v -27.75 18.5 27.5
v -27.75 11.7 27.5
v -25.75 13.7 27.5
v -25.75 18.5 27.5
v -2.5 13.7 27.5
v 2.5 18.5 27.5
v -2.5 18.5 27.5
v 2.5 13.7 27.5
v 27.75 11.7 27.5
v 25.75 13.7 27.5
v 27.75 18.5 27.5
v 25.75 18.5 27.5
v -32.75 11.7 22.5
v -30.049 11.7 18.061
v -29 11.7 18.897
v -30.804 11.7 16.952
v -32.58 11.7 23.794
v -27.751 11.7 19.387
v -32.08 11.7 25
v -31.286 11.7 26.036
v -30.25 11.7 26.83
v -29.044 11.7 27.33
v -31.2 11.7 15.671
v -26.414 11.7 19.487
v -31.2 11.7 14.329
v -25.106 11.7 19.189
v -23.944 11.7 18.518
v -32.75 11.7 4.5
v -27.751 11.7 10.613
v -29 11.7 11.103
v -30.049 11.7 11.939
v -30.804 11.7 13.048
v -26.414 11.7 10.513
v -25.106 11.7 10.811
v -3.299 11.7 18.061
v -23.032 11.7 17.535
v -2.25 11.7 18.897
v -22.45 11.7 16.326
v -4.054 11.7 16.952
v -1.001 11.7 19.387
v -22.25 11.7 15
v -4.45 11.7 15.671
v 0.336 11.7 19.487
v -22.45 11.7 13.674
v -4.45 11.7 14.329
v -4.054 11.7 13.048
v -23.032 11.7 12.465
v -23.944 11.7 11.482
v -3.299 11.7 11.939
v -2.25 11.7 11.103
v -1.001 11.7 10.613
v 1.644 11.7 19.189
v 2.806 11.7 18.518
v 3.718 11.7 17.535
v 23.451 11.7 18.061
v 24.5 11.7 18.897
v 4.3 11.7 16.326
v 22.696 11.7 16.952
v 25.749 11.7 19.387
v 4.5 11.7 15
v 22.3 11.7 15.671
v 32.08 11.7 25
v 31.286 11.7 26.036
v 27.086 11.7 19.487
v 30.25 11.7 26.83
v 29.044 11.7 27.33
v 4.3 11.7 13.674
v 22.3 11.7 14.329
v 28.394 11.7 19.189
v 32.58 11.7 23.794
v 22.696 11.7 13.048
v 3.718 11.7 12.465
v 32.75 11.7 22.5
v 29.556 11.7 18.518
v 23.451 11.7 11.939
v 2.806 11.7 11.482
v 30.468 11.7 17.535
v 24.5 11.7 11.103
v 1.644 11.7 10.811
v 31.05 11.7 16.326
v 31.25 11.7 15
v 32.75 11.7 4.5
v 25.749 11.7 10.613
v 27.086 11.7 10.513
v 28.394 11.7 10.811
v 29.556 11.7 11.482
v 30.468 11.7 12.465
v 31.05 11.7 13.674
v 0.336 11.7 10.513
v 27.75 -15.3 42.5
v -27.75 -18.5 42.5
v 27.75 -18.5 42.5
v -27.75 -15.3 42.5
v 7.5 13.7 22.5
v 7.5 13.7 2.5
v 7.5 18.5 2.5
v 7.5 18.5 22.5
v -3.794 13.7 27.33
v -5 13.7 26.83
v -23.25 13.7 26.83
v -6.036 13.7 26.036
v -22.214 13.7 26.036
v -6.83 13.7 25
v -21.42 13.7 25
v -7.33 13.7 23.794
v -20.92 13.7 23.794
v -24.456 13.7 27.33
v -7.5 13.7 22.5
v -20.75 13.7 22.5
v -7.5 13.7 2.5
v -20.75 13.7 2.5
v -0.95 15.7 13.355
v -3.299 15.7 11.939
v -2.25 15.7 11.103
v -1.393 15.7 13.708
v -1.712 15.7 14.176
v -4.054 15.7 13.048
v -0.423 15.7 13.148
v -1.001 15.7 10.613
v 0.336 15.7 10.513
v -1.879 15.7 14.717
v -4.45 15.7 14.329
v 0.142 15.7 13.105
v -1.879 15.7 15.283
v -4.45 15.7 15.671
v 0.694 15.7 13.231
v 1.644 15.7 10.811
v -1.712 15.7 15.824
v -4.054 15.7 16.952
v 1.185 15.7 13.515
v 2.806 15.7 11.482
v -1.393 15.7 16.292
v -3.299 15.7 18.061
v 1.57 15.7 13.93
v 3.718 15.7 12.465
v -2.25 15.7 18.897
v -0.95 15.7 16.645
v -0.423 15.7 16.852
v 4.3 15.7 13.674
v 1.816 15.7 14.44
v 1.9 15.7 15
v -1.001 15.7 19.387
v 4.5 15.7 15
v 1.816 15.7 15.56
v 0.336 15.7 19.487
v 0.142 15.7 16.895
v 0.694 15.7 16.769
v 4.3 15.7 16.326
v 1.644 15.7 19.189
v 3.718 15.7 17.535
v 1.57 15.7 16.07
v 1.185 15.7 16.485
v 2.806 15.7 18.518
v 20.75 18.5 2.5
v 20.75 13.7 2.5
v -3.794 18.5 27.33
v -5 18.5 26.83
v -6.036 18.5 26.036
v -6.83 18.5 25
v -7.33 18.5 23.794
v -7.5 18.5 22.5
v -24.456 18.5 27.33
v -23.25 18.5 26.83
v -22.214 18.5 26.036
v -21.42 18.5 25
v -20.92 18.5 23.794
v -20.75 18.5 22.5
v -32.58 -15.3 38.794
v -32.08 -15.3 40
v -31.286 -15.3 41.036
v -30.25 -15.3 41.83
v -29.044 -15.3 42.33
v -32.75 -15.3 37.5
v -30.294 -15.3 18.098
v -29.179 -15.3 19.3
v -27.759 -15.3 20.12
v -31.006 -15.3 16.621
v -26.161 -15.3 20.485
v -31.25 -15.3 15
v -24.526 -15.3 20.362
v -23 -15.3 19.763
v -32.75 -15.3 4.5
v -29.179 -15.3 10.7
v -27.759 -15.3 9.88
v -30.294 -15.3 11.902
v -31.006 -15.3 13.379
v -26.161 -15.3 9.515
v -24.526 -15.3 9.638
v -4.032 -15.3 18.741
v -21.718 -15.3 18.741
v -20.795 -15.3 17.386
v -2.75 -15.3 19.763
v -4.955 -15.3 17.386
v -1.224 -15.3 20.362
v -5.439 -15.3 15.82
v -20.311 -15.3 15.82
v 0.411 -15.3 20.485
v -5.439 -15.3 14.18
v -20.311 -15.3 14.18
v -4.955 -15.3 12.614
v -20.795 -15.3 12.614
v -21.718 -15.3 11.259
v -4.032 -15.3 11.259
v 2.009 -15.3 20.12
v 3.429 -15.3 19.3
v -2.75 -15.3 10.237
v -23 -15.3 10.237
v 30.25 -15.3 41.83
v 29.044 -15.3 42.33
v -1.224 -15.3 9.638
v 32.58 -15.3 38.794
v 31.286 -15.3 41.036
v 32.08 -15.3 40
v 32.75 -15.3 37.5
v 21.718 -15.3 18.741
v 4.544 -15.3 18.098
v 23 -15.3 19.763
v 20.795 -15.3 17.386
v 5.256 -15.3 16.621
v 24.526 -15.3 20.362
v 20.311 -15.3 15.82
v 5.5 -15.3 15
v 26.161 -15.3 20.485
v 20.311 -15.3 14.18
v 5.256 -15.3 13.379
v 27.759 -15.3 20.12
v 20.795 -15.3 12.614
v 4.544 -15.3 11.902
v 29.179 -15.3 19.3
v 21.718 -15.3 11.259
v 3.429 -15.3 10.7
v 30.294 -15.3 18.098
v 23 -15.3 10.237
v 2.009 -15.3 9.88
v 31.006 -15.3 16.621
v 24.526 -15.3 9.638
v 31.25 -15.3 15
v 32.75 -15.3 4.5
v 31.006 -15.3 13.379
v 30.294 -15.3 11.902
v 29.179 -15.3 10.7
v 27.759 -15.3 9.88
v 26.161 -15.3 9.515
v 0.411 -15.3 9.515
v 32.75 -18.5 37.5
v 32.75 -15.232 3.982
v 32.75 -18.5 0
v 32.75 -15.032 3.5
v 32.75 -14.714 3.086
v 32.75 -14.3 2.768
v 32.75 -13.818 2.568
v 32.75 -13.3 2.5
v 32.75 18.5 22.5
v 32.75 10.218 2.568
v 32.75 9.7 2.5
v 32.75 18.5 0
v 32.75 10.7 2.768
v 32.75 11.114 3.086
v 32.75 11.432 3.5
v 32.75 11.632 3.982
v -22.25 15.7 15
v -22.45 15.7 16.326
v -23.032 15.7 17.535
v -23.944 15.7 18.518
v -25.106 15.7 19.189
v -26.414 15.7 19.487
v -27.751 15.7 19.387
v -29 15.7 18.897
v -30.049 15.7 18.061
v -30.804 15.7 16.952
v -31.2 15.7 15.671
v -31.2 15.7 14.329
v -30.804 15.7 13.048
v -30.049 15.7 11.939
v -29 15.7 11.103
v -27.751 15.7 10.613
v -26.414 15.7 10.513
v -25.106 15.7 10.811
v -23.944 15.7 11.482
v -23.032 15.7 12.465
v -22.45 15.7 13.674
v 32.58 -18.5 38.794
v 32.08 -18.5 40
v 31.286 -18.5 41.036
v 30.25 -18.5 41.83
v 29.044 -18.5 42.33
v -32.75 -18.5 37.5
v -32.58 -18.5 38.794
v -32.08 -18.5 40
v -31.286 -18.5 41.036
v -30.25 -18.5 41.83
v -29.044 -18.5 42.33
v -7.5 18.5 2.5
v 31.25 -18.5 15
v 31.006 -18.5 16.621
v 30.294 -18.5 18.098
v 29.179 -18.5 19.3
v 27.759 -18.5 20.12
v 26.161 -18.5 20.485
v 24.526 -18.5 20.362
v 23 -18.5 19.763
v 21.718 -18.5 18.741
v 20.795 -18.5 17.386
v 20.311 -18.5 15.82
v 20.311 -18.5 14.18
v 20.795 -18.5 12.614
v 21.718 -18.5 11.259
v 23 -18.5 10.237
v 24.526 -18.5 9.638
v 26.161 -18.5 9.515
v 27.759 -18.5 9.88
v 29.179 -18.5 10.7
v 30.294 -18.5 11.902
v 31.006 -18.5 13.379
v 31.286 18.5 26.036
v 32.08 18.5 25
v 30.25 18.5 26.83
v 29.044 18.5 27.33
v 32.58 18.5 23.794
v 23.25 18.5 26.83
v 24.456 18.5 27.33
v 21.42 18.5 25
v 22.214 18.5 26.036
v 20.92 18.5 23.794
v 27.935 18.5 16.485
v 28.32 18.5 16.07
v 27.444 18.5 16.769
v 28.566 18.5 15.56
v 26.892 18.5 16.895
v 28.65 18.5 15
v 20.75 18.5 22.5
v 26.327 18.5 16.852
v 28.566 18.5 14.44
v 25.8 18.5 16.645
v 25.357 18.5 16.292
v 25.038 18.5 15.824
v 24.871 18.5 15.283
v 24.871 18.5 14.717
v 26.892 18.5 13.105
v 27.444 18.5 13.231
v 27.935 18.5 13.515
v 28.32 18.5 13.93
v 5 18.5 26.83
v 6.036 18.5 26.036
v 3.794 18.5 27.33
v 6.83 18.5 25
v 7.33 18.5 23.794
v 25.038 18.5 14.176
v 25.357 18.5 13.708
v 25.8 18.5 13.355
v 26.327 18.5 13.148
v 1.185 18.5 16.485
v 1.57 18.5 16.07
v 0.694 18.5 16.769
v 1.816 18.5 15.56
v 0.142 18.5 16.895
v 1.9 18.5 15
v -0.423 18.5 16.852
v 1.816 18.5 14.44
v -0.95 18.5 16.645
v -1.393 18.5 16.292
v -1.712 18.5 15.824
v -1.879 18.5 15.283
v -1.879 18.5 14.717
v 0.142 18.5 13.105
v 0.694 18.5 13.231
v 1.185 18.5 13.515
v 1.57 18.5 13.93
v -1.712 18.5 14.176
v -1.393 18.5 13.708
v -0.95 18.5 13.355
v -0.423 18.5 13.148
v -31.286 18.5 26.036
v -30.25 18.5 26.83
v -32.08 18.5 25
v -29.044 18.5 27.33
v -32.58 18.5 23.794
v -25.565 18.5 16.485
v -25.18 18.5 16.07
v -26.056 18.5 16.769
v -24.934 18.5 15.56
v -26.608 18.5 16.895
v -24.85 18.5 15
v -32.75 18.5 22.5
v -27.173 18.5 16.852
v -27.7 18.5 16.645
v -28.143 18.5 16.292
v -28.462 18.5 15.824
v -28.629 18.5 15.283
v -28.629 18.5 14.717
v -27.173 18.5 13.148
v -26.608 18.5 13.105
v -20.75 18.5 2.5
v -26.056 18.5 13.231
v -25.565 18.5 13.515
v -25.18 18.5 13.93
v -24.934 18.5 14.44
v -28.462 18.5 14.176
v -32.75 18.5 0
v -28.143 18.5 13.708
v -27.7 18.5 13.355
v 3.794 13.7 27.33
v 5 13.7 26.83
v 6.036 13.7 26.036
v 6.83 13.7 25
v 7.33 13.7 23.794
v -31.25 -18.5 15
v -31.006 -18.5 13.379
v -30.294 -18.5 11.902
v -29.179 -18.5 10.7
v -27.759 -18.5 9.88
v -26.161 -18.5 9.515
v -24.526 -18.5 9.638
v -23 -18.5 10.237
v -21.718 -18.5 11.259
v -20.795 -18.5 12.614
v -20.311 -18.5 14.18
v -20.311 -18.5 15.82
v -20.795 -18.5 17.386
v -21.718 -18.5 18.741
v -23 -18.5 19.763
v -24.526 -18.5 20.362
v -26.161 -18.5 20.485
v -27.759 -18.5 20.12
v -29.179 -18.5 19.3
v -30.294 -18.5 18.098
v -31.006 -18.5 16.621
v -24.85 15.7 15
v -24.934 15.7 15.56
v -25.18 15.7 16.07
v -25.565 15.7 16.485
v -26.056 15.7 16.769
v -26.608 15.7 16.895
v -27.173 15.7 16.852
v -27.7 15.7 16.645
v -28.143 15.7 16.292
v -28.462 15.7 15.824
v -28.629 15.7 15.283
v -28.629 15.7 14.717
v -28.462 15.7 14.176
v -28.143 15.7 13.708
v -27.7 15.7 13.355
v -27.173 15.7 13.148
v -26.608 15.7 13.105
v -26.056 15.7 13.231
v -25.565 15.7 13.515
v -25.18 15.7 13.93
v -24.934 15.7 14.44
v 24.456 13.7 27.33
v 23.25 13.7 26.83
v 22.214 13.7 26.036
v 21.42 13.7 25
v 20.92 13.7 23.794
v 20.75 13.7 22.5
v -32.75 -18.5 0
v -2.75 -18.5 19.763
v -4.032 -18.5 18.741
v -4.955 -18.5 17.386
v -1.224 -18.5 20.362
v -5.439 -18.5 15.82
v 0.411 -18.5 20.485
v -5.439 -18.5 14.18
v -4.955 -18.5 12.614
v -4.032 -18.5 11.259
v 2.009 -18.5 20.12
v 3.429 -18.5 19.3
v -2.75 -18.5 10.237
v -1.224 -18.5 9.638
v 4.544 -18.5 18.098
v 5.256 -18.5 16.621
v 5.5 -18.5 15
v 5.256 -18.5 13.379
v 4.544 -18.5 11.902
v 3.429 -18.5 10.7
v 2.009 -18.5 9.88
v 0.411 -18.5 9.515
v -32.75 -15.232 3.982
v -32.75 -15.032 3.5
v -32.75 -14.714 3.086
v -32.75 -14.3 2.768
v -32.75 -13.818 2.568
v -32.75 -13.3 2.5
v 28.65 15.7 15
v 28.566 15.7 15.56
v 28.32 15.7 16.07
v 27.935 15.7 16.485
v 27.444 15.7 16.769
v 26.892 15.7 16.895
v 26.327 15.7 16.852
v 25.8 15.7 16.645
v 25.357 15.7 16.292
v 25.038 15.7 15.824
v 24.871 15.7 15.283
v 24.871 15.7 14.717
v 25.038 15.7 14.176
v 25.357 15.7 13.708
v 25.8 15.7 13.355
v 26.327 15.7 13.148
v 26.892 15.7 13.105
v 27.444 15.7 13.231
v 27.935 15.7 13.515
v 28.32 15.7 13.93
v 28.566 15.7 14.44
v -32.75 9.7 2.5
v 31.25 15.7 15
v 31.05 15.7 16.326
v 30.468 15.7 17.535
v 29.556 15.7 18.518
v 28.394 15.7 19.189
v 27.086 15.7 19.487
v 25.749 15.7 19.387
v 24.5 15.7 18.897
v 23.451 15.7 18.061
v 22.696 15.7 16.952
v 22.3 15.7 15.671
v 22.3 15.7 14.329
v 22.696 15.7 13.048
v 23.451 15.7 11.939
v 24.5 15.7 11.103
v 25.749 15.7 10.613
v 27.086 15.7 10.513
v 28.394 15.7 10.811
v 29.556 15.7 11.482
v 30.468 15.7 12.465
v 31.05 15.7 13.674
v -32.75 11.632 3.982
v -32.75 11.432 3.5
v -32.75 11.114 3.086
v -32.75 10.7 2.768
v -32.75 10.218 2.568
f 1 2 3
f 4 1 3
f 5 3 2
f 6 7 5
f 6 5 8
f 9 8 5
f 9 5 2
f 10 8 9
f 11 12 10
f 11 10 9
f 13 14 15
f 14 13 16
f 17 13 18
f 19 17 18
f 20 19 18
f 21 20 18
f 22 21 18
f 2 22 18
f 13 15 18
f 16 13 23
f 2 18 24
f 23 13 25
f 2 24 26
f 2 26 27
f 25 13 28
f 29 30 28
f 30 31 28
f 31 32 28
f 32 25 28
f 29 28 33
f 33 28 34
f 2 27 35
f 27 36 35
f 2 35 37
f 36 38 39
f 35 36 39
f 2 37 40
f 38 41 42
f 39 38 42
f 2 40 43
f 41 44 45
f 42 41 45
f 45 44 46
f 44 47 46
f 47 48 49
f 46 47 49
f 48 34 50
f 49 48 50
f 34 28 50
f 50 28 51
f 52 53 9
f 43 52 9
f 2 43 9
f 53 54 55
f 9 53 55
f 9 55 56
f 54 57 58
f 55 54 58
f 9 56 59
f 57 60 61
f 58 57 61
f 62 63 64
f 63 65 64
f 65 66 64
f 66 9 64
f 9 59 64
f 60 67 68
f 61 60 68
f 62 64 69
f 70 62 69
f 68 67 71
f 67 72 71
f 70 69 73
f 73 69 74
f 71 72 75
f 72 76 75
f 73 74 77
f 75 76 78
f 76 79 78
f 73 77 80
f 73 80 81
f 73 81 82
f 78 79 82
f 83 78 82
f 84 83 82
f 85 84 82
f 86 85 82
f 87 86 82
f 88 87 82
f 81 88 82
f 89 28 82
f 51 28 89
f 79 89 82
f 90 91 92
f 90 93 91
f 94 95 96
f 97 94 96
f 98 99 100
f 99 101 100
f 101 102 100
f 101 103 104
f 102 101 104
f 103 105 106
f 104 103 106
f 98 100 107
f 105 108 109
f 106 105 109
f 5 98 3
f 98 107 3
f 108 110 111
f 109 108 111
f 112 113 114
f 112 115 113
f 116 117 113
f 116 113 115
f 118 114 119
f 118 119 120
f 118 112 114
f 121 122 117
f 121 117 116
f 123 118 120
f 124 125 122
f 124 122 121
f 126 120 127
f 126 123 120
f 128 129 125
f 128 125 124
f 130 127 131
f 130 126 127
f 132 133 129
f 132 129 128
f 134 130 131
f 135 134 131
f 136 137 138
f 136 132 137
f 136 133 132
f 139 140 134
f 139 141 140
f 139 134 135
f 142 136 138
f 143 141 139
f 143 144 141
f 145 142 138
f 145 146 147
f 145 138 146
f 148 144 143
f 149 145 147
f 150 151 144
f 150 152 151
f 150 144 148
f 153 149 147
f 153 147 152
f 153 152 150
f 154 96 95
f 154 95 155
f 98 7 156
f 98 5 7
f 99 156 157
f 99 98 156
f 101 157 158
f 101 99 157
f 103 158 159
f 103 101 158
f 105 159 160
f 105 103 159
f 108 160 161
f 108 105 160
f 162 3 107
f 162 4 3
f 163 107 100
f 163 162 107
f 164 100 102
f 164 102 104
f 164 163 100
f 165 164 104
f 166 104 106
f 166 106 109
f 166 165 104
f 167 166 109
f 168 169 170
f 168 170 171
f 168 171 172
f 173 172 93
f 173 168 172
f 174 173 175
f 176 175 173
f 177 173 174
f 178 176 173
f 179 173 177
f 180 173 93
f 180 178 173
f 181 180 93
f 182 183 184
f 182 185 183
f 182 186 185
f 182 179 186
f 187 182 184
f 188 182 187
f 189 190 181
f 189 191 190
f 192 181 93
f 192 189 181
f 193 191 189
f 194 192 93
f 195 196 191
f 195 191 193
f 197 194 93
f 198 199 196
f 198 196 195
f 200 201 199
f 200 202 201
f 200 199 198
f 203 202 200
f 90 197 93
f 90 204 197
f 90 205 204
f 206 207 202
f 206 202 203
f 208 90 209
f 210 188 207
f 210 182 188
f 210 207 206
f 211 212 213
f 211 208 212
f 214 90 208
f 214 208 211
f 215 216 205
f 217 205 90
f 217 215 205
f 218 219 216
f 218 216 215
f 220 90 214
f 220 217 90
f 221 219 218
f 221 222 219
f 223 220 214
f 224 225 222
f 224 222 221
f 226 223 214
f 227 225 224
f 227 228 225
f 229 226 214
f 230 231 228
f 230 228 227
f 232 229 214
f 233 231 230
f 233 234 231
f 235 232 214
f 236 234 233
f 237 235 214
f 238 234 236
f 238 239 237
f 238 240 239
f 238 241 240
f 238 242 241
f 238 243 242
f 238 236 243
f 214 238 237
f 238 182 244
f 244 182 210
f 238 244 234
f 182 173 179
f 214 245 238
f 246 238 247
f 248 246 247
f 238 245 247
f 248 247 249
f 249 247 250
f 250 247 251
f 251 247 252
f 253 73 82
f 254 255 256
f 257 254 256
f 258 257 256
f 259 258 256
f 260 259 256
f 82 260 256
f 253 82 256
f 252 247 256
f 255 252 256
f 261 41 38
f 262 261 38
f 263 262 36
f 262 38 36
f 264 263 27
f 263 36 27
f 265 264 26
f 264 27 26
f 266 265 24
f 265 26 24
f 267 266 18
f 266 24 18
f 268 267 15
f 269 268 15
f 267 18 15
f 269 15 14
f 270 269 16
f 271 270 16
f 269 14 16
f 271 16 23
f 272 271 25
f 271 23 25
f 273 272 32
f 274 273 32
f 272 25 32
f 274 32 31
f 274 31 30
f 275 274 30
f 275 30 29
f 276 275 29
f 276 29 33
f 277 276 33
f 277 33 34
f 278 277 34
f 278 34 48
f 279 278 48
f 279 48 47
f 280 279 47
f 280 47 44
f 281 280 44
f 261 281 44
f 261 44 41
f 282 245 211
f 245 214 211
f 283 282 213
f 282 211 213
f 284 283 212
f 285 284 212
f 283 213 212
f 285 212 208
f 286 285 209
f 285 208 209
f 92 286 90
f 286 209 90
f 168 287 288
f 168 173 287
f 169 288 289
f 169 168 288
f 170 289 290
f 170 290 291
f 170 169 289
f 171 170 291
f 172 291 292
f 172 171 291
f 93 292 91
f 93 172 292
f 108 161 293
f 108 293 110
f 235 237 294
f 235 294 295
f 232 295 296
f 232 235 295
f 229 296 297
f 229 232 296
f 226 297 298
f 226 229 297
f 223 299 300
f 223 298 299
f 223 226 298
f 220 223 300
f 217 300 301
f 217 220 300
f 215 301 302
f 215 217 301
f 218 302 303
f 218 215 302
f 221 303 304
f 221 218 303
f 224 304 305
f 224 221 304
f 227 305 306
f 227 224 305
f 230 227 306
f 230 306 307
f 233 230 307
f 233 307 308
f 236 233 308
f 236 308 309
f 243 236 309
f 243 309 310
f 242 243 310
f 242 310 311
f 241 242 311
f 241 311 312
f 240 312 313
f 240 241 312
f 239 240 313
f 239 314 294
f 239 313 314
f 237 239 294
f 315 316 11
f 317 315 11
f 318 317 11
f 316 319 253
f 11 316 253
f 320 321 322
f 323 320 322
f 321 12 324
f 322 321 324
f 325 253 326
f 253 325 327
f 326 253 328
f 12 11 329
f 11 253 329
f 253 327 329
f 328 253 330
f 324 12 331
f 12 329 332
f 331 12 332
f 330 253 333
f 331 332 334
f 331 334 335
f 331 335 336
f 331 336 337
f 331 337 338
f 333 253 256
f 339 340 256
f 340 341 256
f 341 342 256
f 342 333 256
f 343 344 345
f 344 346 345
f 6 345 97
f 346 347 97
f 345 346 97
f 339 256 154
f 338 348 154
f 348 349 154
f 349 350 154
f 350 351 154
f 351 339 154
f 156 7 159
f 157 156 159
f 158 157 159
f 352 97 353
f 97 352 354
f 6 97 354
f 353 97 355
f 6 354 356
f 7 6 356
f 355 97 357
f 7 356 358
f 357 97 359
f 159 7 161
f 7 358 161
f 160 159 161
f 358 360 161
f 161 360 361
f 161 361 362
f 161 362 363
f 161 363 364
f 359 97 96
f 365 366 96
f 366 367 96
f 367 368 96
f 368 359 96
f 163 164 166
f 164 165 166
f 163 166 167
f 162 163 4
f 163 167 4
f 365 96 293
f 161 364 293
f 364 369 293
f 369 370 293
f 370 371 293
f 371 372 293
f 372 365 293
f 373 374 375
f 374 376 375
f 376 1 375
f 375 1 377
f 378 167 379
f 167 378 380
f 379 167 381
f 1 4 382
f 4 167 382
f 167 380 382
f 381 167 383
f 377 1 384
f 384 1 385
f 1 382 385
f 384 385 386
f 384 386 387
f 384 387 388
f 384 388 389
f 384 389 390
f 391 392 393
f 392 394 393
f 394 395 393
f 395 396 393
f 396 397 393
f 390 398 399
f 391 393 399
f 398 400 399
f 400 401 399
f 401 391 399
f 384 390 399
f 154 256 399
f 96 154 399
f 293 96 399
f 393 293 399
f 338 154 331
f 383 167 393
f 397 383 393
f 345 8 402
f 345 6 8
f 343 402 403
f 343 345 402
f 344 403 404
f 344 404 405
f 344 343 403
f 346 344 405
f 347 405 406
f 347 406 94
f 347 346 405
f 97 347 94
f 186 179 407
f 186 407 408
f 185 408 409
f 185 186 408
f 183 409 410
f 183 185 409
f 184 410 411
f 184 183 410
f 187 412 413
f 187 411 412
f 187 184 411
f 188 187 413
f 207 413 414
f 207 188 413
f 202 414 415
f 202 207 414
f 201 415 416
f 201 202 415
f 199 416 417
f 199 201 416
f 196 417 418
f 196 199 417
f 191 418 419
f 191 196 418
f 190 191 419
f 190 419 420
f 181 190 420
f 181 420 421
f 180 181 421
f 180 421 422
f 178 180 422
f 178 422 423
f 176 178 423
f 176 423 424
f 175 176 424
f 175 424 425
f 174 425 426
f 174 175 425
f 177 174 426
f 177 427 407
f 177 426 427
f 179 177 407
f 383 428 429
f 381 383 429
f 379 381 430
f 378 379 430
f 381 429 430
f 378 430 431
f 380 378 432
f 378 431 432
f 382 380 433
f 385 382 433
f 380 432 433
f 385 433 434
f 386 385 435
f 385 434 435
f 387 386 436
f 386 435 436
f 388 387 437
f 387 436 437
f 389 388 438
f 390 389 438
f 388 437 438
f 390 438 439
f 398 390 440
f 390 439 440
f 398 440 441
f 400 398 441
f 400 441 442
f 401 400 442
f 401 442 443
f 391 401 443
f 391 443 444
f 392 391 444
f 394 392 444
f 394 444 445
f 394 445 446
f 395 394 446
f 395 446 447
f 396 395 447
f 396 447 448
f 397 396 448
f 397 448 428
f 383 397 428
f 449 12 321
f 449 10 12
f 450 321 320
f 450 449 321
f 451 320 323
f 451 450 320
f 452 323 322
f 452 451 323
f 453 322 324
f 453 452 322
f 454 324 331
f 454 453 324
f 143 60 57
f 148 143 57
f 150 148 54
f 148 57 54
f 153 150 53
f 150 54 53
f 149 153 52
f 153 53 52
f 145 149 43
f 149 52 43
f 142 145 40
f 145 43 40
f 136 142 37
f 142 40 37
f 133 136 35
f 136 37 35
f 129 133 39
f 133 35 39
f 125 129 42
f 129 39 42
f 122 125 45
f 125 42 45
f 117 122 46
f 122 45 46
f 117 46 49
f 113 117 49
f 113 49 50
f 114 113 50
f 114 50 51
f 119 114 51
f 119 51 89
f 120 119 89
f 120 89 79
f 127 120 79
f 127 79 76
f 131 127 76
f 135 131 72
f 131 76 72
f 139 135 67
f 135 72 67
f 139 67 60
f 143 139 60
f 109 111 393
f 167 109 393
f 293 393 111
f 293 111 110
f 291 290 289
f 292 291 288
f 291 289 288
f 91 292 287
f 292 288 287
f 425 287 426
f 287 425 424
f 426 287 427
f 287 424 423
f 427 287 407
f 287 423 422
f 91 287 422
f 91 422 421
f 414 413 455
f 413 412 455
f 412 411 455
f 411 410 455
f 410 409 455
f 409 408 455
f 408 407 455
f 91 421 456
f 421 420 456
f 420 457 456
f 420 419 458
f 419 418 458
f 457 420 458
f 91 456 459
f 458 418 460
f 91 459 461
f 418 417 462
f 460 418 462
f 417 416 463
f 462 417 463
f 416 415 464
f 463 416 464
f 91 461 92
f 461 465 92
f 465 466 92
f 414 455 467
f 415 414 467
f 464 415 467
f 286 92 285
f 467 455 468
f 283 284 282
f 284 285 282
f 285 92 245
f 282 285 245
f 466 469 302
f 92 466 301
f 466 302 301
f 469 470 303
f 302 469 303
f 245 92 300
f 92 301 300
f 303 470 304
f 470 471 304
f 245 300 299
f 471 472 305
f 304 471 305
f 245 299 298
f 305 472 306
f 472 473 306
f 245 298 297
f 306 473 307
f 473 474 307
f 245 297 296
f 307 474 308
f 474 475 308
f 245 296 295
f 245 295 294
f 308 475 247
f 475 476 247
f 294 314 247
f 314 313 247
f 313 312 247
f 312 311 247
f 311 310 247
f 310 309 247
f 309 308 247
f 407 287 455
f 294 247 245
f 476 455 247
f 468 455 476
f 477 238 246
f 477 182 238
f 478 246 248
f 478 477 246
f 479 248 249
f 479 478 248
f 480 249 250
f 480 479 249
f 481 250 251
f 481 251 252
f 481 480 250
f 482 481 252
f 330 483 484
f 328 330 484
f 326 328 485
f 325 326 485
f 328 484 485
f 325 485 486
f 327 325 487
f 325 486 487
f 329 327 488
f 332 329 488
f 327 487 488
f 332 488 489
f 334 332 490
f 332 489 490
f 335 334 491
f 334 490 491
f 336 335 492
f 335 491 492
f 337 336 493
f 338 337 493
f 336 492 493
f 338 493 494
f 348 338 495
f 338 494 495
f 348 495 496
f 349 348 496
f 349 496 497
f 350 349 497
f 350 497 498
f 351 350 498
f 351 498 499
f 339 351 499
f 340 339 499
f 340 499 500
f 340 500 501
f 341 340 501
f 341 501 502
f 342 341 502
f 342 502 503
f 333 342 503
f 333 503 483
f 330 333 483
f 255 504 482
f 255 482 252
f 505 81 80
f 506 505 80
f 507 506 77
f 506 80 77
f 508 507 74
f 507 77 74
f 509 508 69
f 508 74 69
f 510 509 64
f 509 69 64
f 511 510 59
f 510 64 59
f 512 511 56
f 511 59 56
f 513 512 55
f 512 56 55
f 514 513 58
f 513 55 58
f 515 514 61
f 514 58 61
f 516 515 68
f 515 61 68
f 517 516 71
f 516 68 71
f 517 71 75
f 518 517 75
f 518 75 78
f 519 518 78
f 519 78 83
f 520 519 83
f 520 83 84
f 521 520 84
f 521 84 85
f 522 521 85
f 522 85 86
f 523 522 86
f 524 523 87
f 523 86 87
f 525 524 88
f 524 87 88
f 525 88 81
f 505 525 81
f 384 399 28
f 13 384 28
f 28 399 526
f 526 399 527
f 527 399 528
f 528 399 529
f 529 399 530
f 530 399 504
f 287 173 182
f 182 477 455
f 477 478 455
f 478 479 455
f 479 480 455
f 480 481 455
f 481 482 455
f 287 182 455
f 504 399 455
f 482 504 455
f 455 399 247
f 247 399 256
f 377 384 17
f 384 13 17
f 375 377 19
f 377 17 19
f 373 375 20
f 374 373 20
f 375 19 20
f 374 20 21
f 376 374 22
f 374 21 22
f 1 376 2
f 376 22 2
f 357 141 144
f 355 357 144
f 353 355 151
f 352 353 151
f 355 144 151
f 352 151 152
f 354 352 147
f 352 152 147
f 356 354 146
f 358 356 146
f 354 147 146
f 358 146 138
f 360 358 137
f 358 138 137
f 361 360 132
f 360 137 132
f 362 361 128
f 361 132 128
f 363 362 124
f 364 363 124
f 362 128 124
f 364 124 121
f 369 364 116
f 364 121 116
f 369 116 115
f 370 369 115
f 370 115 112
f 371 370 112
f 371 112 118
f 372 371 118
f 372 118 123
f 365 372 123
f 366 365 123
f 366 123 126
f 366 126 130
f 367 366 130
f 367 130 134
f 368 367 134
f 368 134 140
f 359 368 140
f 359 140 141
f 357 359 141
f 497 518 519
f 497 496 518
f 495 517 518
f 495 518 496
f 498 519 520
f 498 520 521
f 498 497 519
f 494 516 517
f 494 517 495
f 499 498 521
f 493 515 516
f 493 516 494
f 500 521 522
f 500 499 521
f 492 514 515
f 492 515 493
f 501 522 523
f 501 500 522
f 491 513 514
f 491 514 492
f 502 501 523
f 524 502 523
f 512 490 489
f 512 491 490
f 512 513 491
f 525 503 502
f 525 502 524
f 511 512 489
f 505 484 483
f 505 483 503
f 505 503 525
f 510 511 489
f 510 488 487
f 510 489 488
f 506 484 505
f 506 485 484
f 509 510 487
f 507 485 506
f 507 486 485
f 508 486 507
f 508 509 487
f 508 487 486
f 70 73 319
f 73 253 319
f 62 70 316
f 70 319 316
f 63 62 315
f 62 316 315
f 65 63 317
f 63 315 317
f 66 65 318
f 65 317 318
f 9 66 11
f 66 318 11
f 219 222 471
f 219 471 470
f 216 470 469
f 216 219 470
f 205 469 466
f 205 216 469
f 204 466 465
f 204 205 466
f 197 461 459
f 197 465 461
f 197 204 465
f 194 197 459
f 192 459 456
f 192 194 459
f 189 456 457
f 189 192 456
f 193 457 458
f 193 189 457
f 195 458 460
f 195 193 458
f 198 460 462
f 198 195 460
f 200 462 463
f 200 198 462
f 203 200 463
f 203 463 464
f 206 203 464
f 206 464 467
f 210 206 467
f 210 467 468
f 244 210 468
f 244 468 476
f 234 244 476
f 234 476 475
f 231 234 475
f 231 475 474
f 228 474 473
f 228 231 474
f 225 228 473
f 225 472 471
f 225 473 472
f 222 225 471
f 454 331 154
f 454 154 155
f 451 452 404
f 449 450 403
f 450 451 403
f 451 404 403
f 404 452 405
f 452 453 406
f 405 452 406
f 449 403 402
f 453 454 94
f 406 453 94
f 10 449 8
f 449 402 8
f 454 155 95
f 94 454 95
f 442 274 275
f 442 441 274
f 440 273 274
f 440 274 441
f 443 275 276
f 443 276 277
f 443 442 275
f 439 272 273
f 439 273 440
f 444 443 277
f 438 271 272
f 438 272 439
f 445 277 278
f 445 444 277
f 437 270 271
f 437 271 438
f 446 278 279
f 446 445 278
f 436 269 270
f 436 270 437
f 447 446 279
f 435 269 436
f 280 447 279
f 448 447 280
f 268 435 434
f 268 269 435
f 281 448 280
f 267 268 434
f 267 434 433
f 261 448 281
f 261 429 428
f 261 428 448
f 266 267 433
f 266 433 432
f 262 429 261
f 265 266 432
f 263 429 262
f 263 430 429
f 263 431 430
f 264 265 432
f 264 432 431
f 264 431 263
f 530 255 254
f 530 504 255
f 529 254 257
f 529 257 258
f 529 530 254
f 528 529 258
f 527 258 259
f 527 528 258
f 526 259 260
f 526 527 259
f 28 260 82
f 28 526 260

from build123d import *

# Parameters (mm, degrees)
F0_W     = 13.25
F0_H     = 4.8
F0_W_2   = 65.5
F0_H_2   = 27
F0_H_3   = 3.2
F1_DEPTH = 2.5
F2_DEPTH = 27.5
F3_DEPTH = 42.5
F4_R     = 1.9
F5_DEPTH = 6.801
F4_R_2   = 4.5
F6_DEPTH = 4
F4_R_3   = 5.5
F7_DEPTH = 30.201
F8_R     = 5
F9_R     = 2


with BuildPart() as f1:
    # F0 (on Top) → F1 (new body)
    with BuildSketch(Plane.XY):
        Polygon((-20.75, 18.5), (-32.75, 18.5), (-32.75, 11.7), (32.75, 11.7), (32.75, 18.5), (20.75, 18.5), (20.75, 13.7), (7.5, 13.7), (7.5, 18.5), (-7.5, 18.5), (-7.5, 13.7), (-20.75, 13.7), align=None)
        with Locations((-14.125, 16.1)):
            Rectangle(F0_W, F0_H)
        with Locations((0, -1.8)):
            Rectangle(F0_W_2, F0_H_2)
        with Locations((0, -16.9)):
            Rectangle(F0_W_2, F0_H_3)
        with Locations((14.125, 16.1)):
            Rectangle(F0_W, F0_H)
    extrude(amount=F1_DEPTH)

    # F0 (on Top) → F2 (join)
    with BuildSketch(Plane.XY):
        Polygon((-20.75, 18.5), (-32.75, 18.5), (-32.75, 11.7), (32.75, 11.7), (32.75, 18.5), (20.75, 18.5), (20.75, 13.7), (7.5, 13.7), (7.5, 18.5), (-7.5, 18.5), (-7.5, 13.7), (-20.75, 13.7), align=None)
    extrude(amount=F2_DEPTH)

    # F0 (on Top) → F3 (join)
    with BuildSketch(Plane.XY):
        with Locations((0, -16.9)):
            Rectangle(F0_W_2, F0_H_3)
    extrude(amount=F3_DEPTH)

    # F4 (on face) → F5 (cut, through all)
    with BuildSketch(Plane.XZ.offset(-11.7)):
        with Locations((-26.75, 15)):
            Circle(F4_R)
        with Locations((0, 15)):
            Circle(F4_R)
        with Locations((26.75, 15)):
            Circle(F4_R)
    extrude(amount=-F5_DEPTH, mode=Mode.SUBTRACT)

    # F4 (on face) → F6 (cut)
    with BuildSketch(Plane.XZ.offset(-11.7)):
        with BuildLine():
            ThreePointArc((-31.25, 15), (-26.75, 10.5), (-22.25, 15))
            ThreePointArc((-22.25, 15), (-26.75, 19.5), (-31.25, 15))
        make_face()
        with Locations((-26.75, 15)):
            Circle(F4_R, mode=Mode.SUBTRACT)
        with Locations((26.75, 15)):
            Circle(F4_R_2)
        with Locations((26.75, 15)):
            Circle(F4_R, mode=Mode.SUBTRACT)
        with Locations((0, 15)):
            Circle(F4_R_2)
        with Locations((0, 15)):
            Circle(F4_R, mode=Mode.SUBTRACT)
    extrude(amount=-F6_DEPTH, mode=Mode.SUBTRACT)

    # F4 (on face) → F7 (cut, through all)
    with BuildSketch(Plane.XZ.offset(-11.7)):
        with Locations((25.75, 15)):
            Circle(F4_R_3)
        with Locations((26.75, 15)):
            Circle(F4_R_2, mode=Mode.SUBTRACT)
        with Locations((0, 15)):
            Circle(F4_R_3)
        with Locations((0, 15)):
            Circle(F4_R_2, mode=Mode.SUBTRACT)
        with BuildLine():
            ThreePointArc((-20.25, 15), (-25.75, 20.5), (-31.25, 15))
            ThreePointArc((-31.25, 15), (-25.75, 9.5), (-20.25, 15))
        make_face()
        with BuildLine():
            ThreePointArc((-31.25, 15), (-26.75, 19.5), (-22.25, 15))
            ThreePointArc((-22.25, 15), (-26.75, 10.5), (-31.25, 15))
        make_face(mode=Mode.SUBTRACT)
        with Locations((26.75, 15)):
            Circle(F4_R_2)
        with Locations((26.75, 15)):
            Circle(F4_R, mode=Mode.SUBTRACT)
        with Locations((0, 15)):
            Circle(F4_R_2)
        with Locations((0, 15)):
            Circle(F4_R, mode=Mode.SUBTRACT)
        with BuildLine():
            ThreePointArc((-31.25, 15), (-26.75, 10.5), (-22.25, 15))
            ThreePointArc((-22.25, 15), (-26.75, 19.5), (-31.25, 15))
        make_face()
        with Locations((-26.75, 15)):
            Circle(F4_R, mode=Mode.SUBTRACT)
        with Locations((26.75, 15)):
            Circle(F4_R)
        with Locations((0, 15)):
            Circle(F4_R)
        with Locations((-26.75, 15)):
            Circle(F4_R)
    extrude(amount=F7_DEPTH, mode=Mode.SUBTRACT)

    # F8
    f8_edges = [f1.edges().sort_by_distance(p)[0] for p in [
        (-32.75, 15.1, 27.5),
        (32.75, 15.1, 27.5),
        (20.75, 16.1, 27.5),
        (7.5, 16.1, 27.5),
        (-7.5, 16.1, 27.5),
        (-20.75, 16.1, 27.5),
        (32.75, -16.9, 42.5),
        (-32.75, -16.9, 42.5),
    ]]
    fillet(f8_edges, radius=F8_R)

    # F9
    f9_edges = [f1.edges().sort_by_distance(p)[0] for p in [
        (0, -15.3, 2.5),
        (0, 11.7, 2.5),
    ]]
    fillet(f9_edges, radius=F9_R)


solid = f1.part
